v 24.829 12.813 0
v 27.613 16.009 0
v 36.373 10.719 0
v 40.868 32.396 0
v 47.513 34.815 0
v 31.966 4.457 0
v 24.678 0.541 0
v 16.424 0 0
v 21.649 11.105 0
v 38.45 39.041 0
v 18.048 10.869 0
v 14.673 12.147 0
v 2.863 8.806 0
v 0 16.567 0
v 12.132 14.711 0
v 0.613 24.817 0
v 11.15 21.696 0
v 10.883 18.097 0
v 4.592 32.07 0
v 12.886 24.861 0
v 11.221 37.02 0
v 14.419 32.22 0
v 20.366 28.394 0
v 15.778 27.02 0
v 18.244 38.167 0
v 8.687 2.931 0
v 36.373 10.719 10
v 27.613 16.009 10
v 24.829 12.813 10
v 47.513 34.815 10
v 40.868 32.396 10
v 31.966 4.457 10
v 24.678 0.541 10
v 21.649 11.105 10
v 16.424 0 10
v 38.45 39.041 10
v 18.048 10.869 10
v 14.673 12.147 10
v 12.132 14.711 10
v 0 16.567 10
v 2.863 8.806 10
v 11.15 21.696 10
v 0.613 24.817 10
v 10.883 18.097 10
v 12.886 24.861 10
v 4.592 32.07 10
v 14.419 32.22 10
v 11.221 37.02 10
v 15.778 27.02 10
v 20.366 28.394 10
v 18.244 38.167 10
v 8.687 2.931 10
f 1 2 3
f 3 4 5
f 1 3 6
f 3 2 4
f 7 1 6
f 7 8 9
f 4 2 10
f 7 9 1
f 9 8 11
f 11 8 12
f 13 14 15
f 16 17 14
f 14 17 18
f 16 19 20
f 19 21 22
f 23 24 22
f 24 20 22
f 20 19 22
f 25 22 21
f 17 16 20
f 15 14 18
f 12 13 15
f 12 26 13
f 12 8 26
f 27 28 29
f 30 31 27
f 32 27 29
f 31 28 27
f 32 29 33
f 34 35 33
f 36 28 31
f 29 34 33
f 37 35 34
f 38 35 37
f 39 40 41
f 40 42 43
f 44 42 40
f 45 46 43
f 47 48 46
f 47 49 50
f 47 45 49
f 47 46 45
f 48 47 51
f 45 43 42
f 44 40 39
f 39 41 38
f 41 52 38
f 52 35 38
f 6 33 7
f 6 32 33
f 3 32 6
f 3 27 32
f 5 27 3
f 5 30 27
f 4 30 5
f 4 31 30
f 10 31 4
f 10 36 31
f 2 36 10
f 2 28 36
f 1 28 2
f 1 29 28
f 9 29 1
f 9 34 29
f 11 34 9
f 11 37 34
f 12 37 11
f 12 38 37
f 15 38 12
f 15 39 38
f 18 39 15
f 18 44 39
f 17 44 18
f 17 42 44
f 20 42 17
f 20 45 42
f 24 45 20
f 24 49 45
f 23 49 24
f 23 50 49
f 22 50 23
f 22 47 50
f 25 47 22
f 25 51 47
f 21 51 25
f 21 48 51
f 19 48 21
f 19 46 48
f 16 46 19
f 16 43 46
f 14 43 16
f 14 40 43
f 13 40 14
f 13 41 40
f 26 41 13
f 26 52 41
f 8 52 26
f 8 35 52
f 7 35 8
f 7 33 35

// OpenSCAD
$fn = 32;

// ----------------------------------------------------------------------
// Hook plate: curl radius 14 mm over 245 degrees, 10 mm thick band
// ----------------------------------------------------------------------

// --- parameters (mm) ---
profile_height = 10;      // extrusion height
profile_points = 26;      // points of the closed outline

profile = [[14.419, 32.22], [18.244, 38.167], [11.221, 37.02], [4.592, 32.07], [0.613, 24.817], [0, 16.567], [2.863, 8.806], [8.687, 2.931], [16.424, 0], [24.678, 0.541], [31.966, 4.457], [36.373, 10.719], [47.513, 34.815], [40.868, 32.396], [38.45, 39.041], [27.613, 16.009], [24.829, 12.813], [21.649, 11.105], [18.048, 10.869], [14.673, 12.147], [12.132, 14.711], [10.883, 18.097], [11.15, 21.696], [12.886, 24.861], [15.778, 27.02], [20.366, 28.394]];  // single closed polygon, 26 points, counter clockwise

// --- the one profile operation ---
linear_extrude(height = profile_height) polygon(points = profile);
